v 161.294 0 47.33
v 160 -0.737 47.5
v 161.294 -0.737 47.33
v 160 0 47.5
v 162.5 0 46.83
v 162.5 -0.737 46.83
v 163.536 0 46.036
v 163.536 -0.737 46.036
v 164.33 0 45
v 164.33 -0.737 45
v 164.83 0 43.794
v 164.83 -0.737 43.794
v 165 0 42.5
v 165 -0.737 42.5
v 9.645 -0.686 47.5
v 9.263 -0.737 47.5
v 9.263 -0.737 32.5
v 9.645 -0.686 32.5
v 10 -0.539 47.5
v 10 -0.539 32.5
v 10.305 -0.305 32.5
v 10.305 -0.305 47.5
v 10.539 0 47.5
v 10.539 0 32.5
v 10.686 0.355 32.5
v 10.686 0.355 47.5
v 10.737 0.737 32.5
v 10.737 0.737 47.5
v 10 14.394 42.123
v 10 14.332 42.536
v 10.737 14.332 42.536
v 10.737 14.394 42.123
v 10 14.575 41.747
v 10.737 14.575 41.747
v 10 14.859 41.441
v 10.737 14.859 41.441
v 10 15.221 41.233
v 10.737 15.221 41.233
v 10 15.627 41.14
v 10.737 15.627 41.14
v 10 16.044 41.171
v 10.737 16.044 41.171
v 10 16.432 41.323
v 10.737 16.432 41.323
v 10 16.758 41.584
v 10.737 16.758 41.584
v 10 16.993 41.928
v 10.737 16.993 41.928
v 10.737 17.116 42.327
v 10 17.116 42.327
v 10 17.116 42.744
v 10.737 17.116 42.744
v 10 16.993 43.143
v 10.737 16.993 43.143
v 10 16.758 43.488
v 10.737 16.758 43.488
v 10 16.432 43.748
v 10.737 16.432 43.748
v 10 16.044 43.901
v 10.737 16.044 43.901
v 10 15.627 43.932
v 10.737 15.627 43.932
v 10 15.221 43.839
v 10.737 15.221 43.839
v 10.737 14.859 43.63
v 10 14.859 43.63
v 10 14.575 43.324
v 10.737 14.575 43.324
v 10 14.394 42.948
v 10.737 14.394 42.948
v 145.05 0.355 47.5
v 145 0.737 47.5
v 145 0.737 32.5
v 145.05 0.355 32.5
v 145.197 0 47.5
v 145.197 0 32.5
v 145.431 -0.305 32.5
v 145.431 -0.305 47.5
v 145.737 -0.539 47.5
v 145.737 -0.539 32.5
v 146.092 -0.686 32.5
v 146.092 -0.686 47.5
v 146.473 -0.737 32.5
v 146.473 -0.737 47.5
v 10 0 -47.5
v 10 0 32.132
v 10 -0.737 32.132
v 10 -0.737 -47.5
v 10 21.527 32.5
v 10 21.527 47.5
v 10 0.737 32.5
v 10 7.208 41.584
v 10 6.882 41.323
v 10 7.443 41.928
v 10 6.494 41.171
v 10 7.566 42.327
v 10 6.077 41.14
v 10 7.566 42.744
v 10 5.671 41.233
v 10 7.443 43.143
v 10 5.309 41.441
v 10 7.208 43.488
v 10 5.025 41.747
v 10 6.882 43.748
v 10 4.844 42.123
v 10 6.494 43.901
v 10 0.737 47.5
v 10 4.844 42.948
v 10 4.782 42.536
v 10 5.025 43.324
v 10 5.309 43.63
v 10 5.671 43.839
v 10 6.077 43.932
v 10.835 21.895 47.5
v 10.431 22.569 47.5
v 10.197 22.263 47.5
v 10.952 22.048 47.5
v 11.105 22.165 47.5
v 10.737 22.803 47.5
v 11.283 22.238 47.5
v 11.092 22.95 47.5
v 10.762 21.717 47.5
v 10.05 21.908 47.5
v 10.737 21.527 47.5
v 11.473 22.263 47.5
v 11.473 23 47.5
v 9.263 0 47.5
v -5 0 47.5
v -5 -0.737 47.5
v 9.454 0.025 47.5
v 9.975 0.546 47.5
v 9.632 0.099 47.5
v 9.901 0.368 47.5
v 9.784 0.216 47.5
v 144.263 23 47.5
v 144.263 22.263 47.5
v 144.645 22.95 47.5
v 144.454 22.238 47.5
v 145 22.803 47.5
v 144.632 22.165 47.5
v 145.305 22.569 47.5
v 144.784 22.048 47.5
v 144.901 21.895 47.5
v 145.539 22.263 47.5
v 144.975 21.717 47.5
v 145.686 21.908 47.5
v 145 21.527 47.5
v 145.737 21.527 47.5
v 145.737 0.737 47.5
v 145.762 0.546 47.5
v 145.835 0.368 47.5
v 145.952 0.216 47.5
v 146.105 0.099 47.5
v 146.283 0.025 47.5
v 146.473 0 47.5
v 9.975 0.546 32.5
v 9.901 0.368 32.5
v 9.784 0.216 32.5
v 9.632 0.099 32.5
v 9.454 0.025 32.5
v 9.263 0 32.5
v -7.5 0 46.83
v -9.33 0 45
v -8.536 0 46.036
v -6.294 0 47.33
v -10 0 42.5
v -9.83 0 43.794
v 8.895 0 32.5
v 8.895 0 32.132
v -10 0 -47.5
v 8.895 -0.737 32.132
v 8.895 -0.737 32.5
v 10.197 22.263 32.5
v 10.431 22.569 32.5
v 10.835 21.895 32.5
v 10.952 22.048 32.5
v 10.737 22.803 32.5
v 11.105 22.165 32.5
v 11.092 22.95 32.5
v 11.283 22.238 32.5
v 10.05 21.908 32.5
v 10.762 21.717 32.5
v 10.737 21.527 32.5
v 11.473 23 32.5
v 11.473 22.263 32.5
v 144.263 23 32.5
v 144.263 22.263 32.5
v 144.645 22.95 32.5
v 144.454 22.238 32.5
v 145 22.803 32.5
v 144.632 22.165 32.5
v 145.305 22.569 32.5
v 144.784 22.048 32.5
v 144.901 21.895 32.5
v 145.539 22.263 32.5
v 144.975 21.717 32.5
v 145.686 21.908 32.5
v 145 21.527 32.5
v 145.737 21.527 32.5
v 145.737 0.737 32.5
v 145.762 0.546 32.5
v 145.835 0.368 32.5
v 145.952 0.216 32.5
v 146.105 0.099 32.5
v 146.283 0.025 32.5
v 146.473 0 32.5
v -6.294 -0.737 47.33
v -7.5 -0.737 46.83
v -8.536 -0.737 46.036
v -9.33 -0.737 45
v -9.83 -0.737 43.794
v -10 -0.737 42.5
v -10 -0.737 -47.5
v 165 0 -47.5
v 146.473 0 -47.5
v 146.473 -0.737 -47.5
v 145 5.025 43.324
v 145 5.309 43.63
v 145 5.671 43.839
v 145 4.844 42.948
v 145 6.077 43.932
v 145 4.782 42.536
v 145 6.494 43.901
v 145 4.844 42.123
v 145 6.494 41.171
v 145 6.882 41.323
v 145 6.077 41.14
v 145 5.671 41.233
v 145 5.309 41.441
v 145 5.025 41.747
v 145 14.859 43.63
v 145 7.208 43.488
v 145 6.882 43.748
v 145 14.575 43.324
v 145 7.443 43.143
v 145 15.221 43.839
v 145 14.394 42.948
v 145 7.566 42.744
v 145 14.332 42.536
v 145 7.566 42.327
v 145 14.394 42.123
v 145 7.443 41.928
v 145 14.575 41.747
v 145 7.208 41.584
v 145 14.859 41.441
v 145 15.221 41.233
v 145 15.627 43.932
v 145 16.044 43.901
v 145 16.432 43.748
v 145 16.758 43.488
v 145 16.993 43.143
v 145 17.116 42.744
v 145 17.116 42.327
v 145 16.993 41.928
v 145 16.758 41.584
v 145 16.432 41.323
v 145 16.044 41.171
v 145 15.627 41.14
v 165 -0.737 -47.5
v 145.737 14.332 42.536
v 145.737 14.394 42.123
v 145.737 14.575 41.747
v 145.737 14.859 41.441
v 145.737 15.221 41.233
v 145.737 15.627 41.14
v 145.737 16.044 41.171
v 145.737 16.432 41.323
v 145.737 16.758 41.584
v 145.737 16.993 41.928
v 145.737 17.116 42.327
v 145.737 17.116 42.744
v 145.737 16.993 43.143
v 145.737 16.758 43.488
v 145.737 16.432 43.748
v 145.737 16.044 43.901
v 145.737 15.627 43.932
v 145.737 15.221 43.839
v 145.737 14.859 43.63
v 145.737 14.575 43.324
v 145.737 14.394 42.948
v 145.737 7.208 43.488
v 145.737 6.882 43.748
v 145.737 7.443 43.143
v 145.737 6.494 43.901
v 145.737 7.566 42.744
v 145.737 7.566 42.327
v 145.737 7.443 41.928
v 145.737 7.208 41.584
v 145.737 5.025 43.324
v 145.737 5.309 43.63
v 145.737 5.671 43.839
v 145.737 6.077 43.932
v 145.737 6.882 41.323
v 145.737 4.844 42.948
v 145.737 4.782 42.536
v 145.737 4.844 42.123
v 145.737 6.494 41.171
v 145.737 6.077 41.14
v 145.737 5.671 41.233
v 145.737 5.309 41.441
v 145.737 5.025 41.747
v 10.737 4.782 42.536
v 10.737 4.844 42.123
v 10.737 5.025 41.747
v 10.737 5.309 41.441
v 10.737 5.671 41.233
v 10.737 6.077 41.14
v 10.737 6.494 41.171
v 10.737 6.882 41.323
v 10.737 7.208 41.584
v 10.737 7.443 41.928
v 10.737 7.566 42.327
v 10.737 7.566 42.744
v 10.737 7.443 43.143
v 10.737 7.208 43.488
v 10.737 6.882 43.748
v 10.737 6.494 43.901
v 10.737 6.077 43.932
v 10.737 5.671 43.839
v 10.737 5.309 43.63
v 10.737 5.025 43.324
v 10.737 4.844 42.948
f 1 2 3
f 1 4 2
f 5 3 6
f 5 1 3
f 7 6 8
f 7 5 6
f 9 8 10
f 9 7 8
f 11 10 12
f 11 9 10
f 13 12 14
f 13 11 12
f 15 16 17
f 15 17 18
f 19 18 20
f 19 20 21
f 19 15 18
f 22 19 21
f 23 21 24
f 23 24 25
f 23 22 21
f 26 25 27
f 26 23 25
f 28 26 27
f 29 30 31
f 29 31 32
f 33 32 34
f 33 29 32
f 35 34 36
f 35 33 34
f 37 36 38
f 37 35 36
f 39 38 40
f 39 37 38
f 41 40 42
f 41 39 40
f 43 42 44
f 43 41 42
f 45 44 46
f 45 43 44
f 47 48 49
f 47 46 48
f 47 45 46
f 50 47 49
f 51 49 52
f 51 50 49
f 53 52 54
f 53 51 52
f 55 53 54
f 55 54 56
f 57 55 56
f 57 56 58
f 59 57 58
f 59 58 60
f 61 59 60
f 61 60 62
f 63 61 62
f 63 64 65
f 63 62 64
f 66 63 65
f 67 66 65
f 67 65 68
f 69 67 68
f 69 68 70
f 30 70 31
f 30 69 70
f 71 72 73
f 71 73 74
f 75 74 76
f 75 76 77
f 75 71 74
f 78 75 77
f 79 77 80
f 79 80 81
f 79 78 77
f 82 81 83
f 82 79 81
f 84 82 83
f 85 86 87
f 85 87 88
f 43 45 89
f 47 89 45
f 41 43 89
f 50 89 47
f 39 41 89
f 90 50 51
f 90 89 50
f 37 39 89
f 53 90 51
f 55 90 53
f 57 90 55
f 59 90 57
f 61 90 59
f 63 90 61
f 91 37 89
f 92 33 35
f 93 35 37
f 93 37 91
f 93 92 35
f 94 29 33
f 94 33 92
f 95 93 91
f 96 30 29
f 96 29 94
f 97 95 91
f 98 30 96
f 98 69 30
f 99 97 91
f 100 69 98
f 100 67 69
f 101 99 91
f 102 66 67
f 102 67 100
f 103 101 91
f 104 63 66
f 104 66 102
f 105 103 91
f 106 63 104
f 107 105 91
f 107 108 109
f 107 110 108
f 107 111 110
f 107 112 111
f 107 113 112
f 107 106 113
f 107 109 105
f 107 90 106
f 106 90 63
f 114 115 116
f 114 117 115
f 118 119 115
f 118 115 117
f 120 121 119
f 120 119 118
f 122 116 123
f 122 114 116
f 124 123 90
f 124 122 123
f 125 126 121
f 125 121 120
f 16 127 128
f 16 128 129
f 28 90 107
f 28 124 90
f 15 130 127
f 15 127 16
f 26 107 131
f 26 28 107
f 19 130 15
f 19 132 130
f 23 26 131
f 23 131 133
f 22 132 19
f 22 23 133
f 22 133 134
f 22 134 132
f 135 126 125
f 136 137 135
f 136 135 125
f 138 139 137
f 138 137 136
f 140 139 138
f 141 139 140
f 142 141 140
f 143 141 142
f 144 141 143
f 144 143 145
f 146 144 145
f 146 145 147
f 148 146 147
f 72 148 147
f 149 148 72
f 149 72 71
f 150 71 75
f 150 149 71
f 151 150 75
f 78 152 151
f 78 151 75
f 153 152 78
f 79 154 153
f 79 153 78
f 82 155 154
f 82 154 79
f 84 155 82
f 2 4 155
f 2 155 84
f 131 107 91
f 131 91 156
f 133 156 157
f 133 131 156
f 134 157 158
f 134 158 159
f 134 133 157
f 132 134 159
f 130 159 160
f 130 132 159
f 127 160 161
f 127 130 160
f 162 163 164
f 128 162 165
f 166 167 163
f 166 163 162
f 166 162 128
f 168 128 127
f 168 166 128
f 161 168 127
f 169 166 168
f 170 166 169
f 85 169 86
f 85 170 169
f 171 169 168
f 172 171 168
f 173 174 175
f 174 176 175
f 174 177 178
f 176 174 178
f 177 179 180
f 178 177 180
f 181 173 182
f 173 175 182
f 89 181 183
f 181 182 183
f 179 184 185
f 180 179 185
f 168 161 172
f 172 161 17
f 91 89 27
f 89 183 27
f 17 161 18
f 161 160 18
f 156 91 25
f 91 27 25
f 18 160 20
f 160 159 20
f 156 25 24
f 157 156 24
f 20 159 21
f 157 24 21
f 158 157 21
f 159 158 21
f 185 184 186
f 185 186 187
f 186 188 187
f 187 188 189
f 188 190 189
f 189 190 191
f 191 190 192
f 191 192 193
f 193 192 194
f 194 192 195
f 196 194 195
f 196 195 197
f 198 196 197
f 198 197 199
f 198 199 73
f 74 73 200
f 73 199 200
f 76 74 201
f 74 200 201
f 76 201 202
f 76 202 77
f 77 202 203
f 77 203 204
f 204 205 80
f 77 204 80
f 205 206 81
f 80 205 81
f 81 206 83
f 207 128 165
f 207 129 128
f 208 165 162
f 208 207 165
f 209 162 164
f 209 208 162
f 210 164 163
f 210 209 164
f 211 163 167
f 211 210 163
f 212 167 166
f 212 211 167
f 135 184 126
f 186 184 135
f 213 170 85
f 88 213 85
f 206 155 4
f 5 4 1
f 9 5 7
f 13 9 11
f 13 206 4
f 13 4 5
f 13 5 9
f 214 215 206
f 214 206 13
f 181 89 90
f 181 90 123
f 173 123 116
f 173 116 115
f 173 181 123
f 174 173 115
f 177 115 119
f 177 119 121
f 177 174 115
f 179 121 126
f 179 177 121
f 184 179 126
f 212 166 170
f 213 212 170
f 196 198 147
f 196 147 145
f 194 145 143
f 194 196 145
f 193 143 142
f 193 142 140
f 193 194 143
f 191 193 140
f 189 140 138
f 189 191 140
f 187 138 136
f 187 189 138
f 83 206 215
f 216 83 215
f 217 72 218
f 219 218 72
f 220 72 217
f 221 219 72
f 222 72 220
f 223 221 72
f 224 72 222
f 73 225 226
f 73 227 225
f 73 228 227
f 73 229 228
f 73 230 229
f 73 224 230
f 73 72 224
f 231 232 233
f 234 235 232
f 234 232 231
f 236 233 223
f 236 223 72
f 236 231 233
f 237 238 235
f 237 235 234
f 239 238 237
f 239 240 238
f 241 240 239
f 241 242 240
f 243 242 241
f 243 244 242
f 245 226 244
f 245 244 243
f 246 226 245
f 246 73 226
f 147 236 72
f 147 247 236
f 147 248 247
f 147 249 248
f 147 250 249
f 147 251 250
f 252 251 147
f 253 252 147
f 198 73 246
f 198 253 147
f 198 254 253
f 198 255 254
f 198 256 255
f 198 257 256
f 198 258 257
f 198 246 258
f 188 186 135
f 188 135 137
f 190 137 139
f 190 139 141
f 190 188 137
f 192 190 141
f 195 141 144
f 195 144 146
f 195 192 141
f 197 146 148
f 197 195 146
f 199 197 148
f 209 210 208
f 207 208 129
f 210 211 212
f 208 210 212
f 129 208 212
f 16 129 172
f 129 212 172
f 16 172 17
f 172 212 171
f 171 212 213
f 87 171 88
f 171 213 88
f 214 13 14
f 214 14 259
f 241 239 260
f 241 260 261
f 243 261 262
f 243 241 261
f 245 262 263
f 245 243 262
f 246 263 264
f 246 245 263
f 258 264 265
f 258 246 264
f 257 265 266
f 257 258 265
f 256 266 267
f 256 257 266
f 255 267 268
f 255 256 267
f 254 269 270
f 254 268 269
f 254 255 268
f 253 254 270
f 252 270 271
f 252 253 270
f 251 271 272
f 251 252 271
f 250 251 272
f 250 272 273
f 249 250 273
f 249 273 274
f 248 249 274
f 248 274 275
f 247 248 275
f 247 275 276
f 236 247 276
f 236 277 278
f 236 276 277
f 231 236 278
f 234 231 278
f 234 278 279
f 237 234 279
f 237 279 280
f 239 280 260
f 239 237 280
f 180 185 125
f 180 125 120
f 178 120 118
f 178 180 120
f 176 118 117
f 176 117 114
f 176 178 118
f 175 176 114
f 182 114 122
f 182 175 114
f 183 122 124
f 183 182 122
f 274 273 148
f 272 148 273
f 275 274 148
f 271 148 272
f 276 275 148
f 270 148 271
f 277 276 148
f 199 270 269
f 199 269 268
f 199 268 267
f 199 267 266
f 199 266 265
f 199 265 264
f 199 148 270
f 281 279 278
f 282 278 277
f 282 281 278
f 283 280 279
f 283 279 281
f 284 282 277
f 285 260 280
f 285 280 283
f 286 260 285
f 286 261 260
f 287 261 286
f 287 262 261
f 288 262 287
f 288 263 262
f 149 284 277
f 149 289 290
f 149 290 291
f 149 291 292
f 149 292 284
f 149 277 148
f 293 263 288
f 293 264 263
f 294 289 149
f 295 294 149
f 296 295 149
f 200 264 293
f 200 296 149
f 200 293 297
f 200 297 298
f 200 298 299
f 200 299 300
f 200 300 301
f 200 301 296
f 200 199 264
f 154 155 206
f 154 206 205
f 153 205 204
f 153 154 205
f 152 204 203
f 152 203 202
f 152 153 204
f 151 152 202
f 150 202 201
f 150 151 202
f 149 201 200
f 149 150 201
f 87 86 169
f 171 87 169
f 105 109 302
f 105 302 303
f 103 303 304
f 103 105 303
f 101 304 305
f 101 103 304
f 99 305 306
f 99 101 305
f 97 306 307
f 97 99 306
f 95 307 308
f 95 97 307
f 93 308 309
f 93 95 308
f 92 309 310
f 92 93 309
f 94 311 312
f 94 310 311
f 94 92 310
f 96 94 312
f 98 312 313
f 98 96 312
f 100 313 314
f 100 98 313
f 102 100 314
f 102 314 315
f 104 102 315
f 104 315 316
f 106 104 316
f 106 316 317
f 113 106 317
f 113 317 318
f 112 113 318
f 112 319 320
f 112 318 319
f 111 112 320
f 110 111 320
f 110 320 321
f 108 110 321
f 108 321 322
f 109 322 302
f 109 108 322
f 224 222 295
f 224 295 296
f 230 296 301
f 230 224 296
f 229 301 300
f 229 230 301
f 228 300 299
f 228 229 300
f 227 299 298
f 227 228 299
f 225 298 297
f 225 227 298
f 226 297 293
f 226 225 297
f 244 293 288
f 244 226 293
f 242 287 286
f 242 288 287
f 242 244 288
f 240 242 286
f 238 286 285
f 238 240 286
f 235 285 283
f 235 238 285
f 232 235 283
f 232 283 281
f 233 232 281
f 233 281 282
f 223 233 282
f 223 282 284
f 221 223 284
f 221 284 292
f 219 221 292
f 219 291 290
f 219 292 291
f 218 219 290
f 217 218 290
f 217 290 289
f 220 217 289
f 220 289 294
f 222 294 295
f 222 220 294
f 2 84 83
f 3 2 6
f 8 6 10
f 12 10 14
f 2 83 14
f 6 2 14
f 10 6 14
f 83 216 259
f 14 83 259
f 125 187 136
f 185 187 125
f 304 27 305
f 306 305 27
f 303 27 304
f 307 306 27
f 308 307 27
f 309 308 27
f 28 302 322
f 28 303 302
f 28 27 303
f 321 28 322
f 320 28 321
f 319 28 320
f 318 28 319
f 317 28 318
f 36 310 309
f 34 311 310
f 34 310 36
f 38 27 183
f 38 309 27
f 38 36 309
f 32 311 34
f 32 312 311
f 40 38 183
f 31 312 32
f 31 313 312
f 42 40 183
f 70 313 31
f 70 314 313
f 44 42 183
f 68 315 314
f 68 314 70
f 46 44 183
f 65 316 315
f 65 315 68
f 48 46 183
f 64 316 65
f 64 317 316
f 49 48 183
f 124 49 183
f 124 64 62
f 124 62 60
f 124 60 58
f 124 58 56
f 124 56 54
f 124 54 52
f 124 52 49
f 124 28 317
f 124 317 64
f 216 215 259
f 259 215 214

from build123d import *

# Parameters (mm, degrees)
SKETCH1_W                     = 20
SKETCH1_H                     = 95
BASE_FLANGE1_DEPTH            = 0.7366
EDGE_FLANGE1_STRIP_W          = 4.4196
EDGE_FLANGE1_STRIP_H          = 0.7366
EDGE_FLANGE1_STRIP_CUT_DEPTH  = 15
EDGE_FLANGE1_RELIEF_W         = 4.7879
EDGE_FLANGE1_RELIEF_H         = 0.3683
EDGE_FLANGE1_RELIEF_CUT_DEPTH = 0.7366
EDGE_FLANGE1_DEPTH            = 15
EDGE_FLANGE2_STRIP_W          = 4.4196
EDGE_FLANGE2_STRIP_H          = 0.7366
EDGE_FLANGE2_STRIP_CUT_DEPTH  = 15
EDGE_FLANGE2_DEPTH            = 15
EDGE_FLANGE3_STRIP_W          = 4.4196
EDGE_FLANGE3_STRIP_H          = 0.7366
EDGE_FLANGE3_STRIP_CUT_DEPTH  = 15
EDGE_FLANGE3_DEPTH            = 15
EDGE_FLANGE4_STRIP_W          = 4.4196
EDGE_FLANGE4_STRIP_H          = 0.7366
EDGE_FLANGE4_STRIP_CUT_DEPTH  = 15
EDGE_FLANGE4_DEPTH            = 15
SKETCH20_W                    = 18.5268
SKETCH20_H                    = 80
TAB1_DEPTH                    = 0.7366
CUT_EXTRUDE1_DEPTH            = 267.594423465
CUT_EXTRUDE1_DEPTH_BACK       = 267.594423465
SKETCH23_R                    = 1.4
CUT_EXTRUDE2_DEPTH            = 267.594423465
CUT_EXTRUDE2_DEPTH_BACK       = 267.594423465
SKETCH24_R                    = 1.4
FILLET3_R                     = 5
FILLET4_R                     = 5


# Sheet-metal steps are written as plain solids
with BuildPart() as part:
    # Sketch1 → Base-Flange1 (new body)
    with BuildSketch(Plane(origin=(0, 0, 0), x_dir=(1, 0, 0), z_dir=(0, 1, 0))):
        Rectangle(SKETCH1_W, SKETCH1_H)
    extrude(amount=-BASE_FLANGE1_DEPTH)

    # Edge-Flange1 strip (across the edge) → Edge-Flange1 strip cut (cut)
    with BuildSketch(Plane(origin=(10, 0, 47.5), x_dir=(-1, 0, 0), z_dir=(0, 0, -1))):
        with Locations((-1.4732, -0.3683)):
            Rectangle(EDGE_FLANGE1_STRIP_W, EDGE_FLANGE1_STRIP_H)
    extrude(amount=EDGE_FLANGE1_STRIP_CUT_DEPTH, mode=Mode.SUBTRACT)

    # Edge-Flange1 relief (on the sheet) → Edge-Flange1 relief cut (cut)
    with BuildSketch(Plane(origin=(9.2634, 0, 47.5), x_dir=(-1, 0, 0), z_dir=(0, 1, 0))):
        with Locations((-2.02565, -15.18415)):
            Rectangle(EDGE_FLANGE1_RELIEF_W, EDGE_FLANGE1_RELIEF_H)
    extrude(amount=-EDGE_FLANGE1_RELIEF_CUT_DEPTH, mode=Mode.SUBTRACT)

    # Edge-Flange1 section (across the edge) → Edge-Flange1 (add)
    with BuildSketch(Plane(origin=(10, 0, 47.5), x_dir=(-1, 0, 0), z_dir=(0, 0, -1))):
        with BuildLine():
            Line((-0.7366, 0.7366), (-0.7366, 22.2634))
            Line((-0.7366, 22.2634), (0, 22.2634))
            Line((0, 22.2634), (0, 0.7366))
            ThreePointArc((0, 0.7366), (0.215745145, 0.215745145), (0.7366, 0))
            Line((0.7366, 0), (0.7366, -0.7366))
            ThreePointArc((0.7366, -0.7366), (-0.30510971, -0.30510971), (-0.7366, 0.7366))
        make_face()
    extrude(amount=EDGE_FLANGE1_DEPTH)

    # Edge-Flange2 strip (across the edge) → Edge-Flange2 strip cut (cut)
    with BuildSketch(Plane(origin=(10.7366, 22.2634, 32.5), x_dir=(0, -1, 0), z_dir=(0, 0, 1))):
        with Locations((-1.4732, -0.3683)):
            Rectangle(EDGE_FLANGE2_STRIP_W, EDGE_FLANGE2_STRIP_H)
    extrude(amount=EDGE_FLANGE2_STRIP_CUT_DEPTH, mode=Mode.SUBTRACT)

    # Edge-Flange2 section (across the edge) → Edge-Flange2 (add)
    with BuildSketch(Plane(origin=(10.7366, 22.2634, 32.5), x_dir=(0, -1, 0), z_dir=(0, 0, 1))):
        with BuildLine():
            Line((-0.7366, 0.7366), (-0.7366, 134.2634))
            Line((-0.7366, 134.2634), (0, 134.2634))
            Line((0, 134.2634), (0, 0.7366))
            ThreePointArc((0, 0.7366), (0.215745145, 0.215745145), (0.7366, 0))
            Line((0.7366, 0), (0.7366, -0.7366))
            ThreePointArc((0.7366, -0.7366), (-0.30510971, -0.30510971), (-0.7366, 0.7366))
        make_face()
    extrude(amount=EDGE_FLANGE2_DEPTH)

    # Edge-Flange3 strip (across the edge) → Edge-Flange3 strip cut (cut)
    with BuildSketch(Plane(origin=(145, 22.2634, 32.5), x_dir=(-1, 0, 0), z_dir=(0, 0, 1))):
        with Locations((-1.4732, -0.3683)):
            Rectangle(EDGE_FLANGE3_STRIP_W, EDGE_FLANGE3_STRIP_H)
    extrude(amount=EDGE_FLANGE3_STRIP_CUT_DEPTH, mode=Mode.SUBTRACT)

    # Edge-Flange3 section (across the edge) → Edge-Flange3 (add)
    with BuildSketch(Plane(origin=(145, 22.2634, 32.5), x_dir=(-1, 0, 0), z_dir=(0, 0, 1))):
        with BuildLine():
            Line((-0.7366, 0.7366), (-0.7366, 22.2634))
            Line((-0.7366, 22.2634), (0, 22.2634))
            Line((0, 22.2634), (0, 0.7366))
            ThreePointArc((0, 0.7366), (0.215745145, 0.215745145), (0.7366, 0))
            Line((0.7366, 0), (0.7366, -0.7366))
            ThreePointArc((0.7366, -0.7366), (-0.30510971, -0.30510971), (-0.7366, 0.7366))
        make_face()
    extrude(amount=EDGE_FLANGE3_DEPTH)

    # Edge-Flange4 strip (across the edge) → Edge-Flange4 strip cut (cut)
    with BuildSketch(Plane(origin=(145.7366, 0, 47.5), x_dir=(0, 1, 0), z_dir=(0, 0, -1))):
        with Locations((-1.4732, -0.3683)):
            Rectangle(EDGE_FLANGE4_STRIP_W, EDGE_FLANGE4_STRIP_H)
    extrude(amount=EDGE_FLANGE4_STRIP_CUT_DEPTH, mode=Mode.SUBTRACT)

    # Edge-Flange4 section (across the edge) → Edge-Flange4 (add)
    with BuildSketch(Plane(origin=(145.7366, 0, 47.5), x_dir=(0, 1, 0), z_dir=(0, 0, -1))):
        with BuildLine():
            Line((-0.7366, 0.7366), (-0.7366, 19.2634))
            Line((-0.7366, 19.2634), (0, 19.2634))
            Line((0, 19.2634), (0, 0.7366))
            ThreePointArc((0, 0.7366), (0.215745145, 0.215745145), (0.7366, 0))
            Line((0.7366, 0), (0.7366, -0.7366))
            ThreePointArc((0.7366, -0.7366), (-0.30510971, -0.30510971), (-0.7366, 0.7366))
        make_face()
    extrude(amount=EDGE_FLANGE4_DEPTH)

    # Sketch20 → Tab1 (add)
    with BuildSketch(Plane(origin=(0, 0, 0), x_dir=(1, 0, 0), z_dir=(0, 1, 0))):
        with Locations((155.7366, 7.5)):
            Rectangle(SKETCH20_W, SKETCH20_H)
    extrude(amount=-TAB1_DEPTH)

    # Sketch23 → Cut-Extrude1 (cut, two sides: drawn at the far end of the back side and taken through both)
    with BuildSketch(Plane(origin=(10.7366, -49.681752082, -157.421333583), x_dir=(0, 0, -1), z_dir=(1, 0, 0)).offset(-CUT_EXTRUDE1_DEPTH_BACK)):
        with Locations(Location((-199.95707875, 65.413752097, 0), (0, 0, 270))):
            Circle(SKETCH23_R)
    extrude(amount=CUT_EXTRUDE1_DEPTH + CUT_EXTRUDE1_DEPTH_BACK, mode=Mode.SUBTRACT)

    # Sketch24 → Cut-Extrude2 (cut, two sides: drawn at the far end of the back side and taken through both)
    with BuildSketch(Plane(origin=(10.7366, -49.681752082, -157.421333583), x_dir=(0, 0, -1), z_dir=(1, 0, 0)).offset(-CUT_EXTRUDE2_DEPTH_BACK)):
        with Locations(Location((-199.95707875, 55.863752097, 0), (0, 0, 270))):
            Circle(SKETCH24_R)
    extrude(amount=CUT_EXTRUDE2_DEPTH + CUT_EXTRUDE2_DEPTH_BACK, mode=Mode.SUBTRACT)

    # Fillet3
    fillet3_edges = [part.edges().sort_by_distance(p)[0] for p in [
        (-10, -0.3683, 47.5),
    ]]
    fillet(fillet3_edges, radius=FILLET3_R)

    # Fillet4
    fillet4_edges = [part.edges().sort_by_distance(p)[0] for p in [
        (165, -0.3683, 47.5),
    ]]
    fillet(fillet4_edges, radius=FILLET4_R)


solid = part.part
